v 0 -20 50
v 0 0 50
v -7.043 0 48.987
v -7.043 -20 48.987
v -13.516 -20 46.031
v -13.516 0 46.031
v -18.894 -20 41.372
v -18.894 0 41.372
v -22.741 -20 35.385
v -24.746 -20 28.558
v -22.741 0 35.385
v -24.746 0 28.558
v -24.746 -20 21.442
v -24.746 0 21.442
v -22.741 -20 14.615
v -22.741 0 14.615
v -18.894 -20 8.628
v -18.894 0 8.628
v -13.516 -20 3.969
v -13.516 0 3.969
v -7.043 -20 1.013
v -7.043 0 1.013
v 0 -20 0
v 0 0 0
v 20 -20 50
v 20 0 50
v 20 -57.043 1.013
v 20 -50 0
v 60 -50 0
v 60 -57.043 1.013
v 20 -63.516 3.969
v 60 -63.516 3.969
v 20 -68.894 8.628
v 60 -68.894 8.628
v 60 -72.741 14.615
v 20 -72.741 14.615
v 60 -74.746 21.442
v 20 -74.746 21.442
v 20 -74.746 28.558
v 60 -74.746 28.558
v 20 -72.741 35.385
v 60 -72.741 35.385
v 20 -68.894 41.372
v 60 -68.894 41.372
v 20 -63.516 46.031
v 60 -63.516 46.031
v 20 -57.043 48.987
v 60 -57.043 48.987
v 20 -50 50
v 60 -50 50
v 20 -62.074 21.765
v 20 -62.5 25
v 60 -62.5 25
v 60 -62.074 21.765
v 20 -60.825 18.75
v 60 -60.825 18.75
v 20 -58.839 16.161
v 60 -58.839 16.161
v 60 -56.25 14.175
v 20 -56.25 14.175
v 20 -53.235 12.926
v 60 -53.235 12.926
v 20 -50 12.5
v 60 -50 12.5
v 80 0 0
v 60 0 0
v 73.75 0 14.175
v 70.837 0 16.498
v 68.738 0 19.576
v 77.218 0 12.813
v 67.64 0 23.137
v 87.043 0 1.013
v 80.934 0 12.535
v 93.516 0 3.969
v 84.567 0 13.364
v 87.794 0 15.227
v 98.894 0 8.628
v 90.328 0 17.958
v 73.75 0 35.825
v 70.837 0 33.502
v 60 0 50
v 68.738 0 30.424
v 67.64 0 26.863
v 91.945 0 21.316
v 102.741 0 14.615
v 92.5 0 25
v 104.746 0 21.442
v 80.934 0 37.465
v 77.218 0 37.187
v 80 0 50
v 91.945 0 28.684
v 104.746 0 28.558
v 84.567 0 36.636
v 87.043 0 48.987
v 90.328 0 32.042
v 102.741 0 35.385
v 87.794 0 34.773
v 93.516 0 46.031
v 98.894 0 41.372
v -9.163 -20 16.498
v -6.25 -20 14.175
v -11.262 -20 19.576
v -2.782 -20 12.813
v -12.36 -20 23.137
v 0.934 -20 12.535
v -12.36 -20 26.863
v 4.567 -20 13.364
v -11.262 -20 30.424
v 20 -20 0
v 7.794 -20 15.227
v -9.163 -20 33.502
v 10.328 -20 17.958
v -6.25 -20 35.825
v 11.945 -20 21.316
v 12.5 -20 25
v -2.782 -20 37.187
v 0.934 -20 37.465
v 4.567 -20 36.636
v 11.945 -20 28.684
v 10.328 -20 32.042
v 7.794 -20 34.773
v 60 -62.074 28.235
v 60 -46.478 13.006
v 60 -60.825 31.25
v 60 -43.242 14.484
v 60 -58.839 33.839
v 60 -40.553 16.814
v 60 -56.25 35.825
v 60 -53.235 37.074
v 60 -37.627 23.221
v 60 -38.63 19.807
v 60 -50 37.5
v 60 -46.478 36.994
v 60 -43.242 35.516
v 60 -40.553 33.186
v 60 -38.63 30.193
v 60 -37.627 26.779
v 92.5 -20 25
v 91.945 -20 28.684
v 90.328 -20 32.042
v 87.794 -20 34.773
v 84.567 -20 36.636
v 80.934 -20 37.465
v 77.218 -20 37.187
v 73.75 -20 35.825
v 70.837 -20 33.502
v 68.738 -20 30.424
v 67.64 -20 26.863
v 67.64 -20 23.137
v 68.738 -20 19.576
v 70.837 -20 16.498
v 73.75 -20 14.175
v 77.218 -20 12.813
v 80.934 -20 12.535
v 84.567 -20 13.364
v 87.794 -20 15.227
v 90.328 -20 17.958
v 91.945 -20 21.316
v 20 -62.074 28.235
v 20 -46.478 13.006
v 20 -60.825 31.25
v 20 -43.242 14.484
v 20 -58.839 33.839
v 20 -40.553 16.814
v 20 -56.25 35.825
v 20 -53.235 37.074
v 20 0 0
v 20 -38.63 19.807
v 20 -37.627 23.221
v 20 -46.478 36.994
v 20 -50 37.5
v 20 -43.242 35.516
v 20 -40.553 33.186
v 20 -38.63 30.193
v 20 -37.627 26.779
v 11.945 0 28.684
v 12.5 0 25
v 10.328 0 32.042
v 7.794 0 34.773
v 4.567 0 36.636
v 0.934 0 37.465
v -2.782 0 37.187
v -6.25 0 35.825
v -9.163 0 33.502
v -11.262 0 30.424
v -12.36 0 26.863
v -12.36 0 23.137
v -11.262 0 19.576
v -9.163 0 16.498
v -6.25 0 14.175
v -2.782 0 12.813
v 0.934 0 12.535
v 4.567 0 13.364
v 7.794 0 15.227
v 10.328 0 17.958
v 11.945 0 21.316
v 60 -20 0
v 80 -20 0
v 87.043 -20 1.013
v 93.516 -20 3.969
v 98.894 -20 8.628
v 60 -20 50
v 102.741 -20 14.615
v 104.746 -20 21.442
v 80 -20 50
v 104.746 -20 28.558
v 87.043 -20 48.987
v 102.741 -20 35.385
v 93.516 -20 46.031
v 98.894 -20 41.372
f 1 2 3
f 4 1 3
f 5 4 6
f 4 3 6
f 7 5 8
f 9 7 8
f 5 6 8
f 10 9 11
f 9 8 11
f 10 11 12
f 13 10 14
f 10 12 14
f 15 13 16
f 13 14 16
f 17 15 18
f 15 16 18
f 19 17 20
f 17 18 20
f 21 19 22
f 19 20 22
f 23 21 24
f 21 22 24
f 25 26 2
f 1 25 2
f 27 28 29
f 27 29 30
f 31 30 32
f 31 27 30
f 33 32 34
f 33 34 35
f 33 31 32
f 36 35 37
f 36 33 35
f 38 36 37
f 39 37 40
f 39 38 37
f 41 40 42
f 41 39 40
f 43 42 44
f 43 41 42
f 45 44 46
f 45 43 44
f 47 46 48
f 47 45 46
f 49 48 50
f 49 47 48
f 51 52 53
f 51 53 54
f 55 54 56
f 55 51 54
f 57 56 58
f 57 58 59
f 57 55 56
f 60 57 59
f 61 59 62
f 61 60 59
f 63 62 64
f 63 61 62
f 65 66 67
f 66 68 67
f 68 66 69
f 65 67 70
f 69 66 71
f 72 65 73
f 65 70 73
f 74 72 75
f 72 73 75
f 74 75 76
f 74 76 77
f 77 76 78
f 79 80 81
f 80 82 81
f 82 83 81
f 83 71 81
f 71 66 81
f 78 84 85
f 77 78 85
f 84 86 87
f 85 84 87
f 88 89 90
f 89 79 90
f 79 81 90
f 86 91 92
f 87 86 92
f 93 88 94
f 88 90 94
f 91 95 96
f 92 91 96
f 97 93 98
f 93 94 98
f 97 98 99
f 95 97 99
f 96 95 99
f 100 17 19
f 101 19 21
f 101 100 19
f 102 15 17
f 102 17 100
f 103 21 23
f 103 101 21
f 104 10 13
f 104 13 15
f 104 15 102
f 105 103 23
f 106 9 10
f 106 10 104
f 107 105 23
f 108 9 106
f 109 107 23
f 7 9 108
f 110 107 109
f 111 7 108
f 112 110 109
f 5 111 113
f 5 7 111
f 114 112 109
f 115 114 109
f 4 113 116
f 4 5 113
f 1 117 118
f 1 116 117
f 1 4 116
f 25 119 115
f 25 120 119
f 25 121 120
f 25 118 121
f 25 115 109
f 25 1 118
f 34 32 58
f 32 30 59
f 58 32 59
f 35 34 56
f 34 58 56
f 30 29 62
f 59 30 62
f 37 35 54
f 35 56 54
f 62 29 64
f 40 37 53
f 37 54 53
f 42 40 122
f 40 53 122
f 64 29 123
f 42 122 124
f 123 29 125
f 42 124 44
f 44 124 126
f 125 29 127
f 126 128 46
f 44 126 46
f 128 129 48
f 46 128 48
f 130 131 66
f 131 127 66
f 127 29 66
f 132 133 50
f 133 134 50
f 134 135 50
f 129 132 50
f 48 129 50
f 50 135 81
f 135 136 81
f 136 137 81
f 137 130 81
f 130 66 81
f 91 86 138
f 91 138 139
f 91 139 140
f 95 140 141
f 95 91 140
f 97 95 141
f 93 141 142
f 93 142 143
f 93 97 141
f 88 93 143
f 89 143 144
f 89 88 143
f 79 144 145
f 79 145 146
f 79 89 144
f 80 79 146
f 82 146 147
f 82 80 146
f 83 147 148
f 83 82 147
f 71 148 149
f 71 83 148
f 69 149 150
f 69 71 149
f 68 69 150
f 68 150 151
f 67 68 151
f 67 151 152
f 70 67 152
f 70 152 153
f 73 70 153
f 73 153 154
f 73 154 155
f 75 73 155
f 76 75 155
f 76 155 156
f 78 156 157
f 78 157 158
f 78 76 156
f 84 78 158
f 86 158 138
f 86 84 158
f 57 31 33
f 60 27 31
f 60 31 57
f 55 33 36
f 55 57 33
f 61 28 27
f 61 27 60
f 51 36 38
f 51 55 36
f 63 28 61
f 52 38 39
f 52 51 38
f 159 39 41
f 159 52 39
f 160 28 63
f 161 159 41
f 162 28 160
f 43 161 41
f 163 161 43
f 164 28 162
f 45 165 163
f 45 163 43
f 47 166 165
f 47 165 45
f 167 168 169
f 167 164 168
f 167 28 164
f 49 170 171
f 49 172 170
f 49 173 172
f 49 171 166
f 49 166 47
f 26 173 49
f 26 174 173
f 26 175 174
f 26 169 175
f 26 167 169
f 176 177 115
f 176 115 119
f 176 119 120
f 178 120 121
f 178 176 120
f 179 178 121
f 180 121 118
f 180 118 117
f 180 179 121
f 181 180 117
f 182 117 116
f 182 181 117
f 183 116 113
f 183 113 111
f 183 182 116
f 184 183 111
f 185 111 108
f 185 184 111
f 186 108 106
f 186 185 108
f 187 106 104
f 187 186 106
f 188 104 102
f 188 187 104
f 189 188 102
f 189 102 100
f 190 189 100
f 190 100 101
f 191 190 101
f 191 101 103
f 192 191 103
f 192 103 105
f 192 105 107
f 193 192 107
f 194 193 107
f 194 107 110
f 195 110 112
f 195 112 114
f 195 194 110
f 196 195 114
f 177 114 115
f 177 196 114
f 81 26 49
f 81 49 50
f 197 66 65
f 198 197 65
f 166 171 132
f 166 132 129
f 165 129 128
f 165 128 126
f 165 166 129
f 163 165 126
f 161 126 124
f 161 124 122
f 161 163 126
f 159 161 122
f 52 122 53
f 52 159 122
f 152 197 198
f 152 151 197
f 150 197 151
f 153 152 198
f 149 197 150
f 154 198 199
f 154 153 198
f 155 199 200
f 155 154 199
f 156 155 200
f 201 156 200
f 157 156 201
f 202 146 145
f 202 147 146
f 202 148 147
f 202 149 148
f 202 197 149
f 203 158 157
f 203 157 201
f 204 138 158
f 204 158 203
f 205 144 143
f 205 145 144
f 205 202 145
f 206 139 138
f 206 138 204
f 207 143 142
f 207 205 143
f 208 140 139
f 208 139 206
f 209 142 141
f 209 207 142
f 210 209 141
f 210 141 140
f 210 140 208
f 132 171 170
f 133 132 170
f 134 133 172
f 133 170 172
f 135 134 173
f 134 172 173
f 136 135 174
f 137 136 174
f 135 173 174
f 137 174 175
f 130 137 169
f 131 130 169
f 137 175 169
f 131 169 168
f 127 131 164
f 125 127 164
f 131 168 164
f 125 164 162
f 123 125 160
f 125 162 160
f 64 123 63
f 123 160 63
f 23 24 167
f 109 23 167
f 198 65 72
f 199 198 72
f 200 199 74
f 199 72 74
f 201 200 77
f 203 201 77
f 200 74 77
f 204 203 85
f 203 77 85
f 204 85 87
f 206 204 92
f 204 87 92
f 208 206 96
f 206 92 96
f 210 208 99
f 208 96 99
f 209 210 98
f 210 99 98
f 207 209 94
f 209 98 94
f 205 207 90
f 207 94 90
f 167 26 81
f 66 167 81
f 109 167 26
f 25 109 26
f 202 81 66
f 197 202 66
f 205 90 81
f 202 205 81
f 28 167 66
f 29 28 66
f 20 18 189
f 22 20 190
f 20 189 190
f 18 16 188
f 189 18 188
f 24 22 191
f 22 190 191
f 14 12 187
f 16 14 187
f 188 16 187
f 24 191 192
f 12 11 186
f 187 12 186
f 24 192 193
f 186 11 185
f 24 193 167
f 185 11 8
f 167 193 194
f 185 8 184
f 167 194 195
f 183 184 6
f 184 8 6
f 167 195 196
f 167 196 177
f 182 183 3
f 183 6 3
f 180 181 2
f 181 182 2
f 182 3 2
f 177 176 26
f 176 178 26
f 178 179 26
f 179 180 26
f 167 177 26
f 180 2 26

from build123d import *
from build123d import SkipClean  # not in build123d's __all__

# Parameters (mm, degrees)
F0_R     = 12.5
F1_DEPTH = 20
F0_W     = 40
F0_H     = 50
F2_DEPTH = 50
F4_DEPTH = 40
F5_DEPTH = 85.001


with BuildPart() as f1:
    # F0 (on Front) → F1 (new body)
    with BuildSketch(Plane.XZ):
        with BuildLine():
            Line((20, 50), (0, 50))
            ThreePointArc((0, 50), (-25, 25), (0, 0))
            Line((0, 0), (20, 0))
            Line((20, 0), (20, 50))
        make_face()
        with Locations((0, 25)):
            Circle(F0_R, mode=Mode.SUBTRACT)
    extrude(amount=F1_DEPTH)


with BuildPart() as f1b:
    # F0 (on Front) → F1, piece 2 (new body)
    with BuildSketch(Plane.XZ):
        with BuildLine():
            Line((80, 50), (60, 50))
            Line((60, 50), (60, 0))
            Line((60, 0), (80, 0))
            ThreePointArc((80, 0), (105, 25), (80, 50))
        make_face()
        with Locations((80, 25)):
            Circle(F0_R, mode=Mode.SUBTRACT)
    extrude(amount=F1_DEPTH)


with BuildPart() as f2:
    # F0 (on Front) → F2 (new body)
    with BuildSketch(Plane.XZ):
        with Locations((40, 25)):
            Rectangle(F0_W, F0_H)
    extrude(amount=F2_DEPTH)

    # F3 (on face) → F4 (join, through all)
    with BuildSketch(Plane(origin=(20, 0, 0), x_dir=(0, -1, 0), z_dir=(-1, 0, 0))):
        with BuildLine():
            ThreePointArc((50, 37.5), (37.5, 25), (50, 12.5))
            Line((50, 12.5), (50, 37.5))
        make_face()
        with BuildLine():
            Line((50, 12.5), (50, 0))
            ThreePointArc((50, 0), (75, 25), (50, 50))
            Line((50, 50), (50, 37.5))
            ThreePointArc((50, 37.5), (58.8388347648, 33.8388347648), (62.5, 25))
            ThreePointArc((62.5, 25), (58.8388347648, 16.1611652352), (50, 12.5))
        make_face()
    extrude(amount=-F4_DEPTH)

    # F3 (on face) → F5 (cut, through all)
    with BuildSketch(Plane(origin=(20, 0, 0), x_dir=(0, -1, 0), z_dir=(-1, 0, 0))):
        with BuildLine():
            ThreePointArc((50, 37.5), (37.5, 25), (50, 12.5))
            Line((50, 12.5), (50, 37.5))
        make_face()
    with SkipClean():  # cleaning this boolean's faces spoils the solid; the shape is the same uncleaned
        extrude(amount=-F5_DEPTH, mode=Mode.SUBTRACT)


solid = Compound([f1.part, f1b.part, f2.part])
